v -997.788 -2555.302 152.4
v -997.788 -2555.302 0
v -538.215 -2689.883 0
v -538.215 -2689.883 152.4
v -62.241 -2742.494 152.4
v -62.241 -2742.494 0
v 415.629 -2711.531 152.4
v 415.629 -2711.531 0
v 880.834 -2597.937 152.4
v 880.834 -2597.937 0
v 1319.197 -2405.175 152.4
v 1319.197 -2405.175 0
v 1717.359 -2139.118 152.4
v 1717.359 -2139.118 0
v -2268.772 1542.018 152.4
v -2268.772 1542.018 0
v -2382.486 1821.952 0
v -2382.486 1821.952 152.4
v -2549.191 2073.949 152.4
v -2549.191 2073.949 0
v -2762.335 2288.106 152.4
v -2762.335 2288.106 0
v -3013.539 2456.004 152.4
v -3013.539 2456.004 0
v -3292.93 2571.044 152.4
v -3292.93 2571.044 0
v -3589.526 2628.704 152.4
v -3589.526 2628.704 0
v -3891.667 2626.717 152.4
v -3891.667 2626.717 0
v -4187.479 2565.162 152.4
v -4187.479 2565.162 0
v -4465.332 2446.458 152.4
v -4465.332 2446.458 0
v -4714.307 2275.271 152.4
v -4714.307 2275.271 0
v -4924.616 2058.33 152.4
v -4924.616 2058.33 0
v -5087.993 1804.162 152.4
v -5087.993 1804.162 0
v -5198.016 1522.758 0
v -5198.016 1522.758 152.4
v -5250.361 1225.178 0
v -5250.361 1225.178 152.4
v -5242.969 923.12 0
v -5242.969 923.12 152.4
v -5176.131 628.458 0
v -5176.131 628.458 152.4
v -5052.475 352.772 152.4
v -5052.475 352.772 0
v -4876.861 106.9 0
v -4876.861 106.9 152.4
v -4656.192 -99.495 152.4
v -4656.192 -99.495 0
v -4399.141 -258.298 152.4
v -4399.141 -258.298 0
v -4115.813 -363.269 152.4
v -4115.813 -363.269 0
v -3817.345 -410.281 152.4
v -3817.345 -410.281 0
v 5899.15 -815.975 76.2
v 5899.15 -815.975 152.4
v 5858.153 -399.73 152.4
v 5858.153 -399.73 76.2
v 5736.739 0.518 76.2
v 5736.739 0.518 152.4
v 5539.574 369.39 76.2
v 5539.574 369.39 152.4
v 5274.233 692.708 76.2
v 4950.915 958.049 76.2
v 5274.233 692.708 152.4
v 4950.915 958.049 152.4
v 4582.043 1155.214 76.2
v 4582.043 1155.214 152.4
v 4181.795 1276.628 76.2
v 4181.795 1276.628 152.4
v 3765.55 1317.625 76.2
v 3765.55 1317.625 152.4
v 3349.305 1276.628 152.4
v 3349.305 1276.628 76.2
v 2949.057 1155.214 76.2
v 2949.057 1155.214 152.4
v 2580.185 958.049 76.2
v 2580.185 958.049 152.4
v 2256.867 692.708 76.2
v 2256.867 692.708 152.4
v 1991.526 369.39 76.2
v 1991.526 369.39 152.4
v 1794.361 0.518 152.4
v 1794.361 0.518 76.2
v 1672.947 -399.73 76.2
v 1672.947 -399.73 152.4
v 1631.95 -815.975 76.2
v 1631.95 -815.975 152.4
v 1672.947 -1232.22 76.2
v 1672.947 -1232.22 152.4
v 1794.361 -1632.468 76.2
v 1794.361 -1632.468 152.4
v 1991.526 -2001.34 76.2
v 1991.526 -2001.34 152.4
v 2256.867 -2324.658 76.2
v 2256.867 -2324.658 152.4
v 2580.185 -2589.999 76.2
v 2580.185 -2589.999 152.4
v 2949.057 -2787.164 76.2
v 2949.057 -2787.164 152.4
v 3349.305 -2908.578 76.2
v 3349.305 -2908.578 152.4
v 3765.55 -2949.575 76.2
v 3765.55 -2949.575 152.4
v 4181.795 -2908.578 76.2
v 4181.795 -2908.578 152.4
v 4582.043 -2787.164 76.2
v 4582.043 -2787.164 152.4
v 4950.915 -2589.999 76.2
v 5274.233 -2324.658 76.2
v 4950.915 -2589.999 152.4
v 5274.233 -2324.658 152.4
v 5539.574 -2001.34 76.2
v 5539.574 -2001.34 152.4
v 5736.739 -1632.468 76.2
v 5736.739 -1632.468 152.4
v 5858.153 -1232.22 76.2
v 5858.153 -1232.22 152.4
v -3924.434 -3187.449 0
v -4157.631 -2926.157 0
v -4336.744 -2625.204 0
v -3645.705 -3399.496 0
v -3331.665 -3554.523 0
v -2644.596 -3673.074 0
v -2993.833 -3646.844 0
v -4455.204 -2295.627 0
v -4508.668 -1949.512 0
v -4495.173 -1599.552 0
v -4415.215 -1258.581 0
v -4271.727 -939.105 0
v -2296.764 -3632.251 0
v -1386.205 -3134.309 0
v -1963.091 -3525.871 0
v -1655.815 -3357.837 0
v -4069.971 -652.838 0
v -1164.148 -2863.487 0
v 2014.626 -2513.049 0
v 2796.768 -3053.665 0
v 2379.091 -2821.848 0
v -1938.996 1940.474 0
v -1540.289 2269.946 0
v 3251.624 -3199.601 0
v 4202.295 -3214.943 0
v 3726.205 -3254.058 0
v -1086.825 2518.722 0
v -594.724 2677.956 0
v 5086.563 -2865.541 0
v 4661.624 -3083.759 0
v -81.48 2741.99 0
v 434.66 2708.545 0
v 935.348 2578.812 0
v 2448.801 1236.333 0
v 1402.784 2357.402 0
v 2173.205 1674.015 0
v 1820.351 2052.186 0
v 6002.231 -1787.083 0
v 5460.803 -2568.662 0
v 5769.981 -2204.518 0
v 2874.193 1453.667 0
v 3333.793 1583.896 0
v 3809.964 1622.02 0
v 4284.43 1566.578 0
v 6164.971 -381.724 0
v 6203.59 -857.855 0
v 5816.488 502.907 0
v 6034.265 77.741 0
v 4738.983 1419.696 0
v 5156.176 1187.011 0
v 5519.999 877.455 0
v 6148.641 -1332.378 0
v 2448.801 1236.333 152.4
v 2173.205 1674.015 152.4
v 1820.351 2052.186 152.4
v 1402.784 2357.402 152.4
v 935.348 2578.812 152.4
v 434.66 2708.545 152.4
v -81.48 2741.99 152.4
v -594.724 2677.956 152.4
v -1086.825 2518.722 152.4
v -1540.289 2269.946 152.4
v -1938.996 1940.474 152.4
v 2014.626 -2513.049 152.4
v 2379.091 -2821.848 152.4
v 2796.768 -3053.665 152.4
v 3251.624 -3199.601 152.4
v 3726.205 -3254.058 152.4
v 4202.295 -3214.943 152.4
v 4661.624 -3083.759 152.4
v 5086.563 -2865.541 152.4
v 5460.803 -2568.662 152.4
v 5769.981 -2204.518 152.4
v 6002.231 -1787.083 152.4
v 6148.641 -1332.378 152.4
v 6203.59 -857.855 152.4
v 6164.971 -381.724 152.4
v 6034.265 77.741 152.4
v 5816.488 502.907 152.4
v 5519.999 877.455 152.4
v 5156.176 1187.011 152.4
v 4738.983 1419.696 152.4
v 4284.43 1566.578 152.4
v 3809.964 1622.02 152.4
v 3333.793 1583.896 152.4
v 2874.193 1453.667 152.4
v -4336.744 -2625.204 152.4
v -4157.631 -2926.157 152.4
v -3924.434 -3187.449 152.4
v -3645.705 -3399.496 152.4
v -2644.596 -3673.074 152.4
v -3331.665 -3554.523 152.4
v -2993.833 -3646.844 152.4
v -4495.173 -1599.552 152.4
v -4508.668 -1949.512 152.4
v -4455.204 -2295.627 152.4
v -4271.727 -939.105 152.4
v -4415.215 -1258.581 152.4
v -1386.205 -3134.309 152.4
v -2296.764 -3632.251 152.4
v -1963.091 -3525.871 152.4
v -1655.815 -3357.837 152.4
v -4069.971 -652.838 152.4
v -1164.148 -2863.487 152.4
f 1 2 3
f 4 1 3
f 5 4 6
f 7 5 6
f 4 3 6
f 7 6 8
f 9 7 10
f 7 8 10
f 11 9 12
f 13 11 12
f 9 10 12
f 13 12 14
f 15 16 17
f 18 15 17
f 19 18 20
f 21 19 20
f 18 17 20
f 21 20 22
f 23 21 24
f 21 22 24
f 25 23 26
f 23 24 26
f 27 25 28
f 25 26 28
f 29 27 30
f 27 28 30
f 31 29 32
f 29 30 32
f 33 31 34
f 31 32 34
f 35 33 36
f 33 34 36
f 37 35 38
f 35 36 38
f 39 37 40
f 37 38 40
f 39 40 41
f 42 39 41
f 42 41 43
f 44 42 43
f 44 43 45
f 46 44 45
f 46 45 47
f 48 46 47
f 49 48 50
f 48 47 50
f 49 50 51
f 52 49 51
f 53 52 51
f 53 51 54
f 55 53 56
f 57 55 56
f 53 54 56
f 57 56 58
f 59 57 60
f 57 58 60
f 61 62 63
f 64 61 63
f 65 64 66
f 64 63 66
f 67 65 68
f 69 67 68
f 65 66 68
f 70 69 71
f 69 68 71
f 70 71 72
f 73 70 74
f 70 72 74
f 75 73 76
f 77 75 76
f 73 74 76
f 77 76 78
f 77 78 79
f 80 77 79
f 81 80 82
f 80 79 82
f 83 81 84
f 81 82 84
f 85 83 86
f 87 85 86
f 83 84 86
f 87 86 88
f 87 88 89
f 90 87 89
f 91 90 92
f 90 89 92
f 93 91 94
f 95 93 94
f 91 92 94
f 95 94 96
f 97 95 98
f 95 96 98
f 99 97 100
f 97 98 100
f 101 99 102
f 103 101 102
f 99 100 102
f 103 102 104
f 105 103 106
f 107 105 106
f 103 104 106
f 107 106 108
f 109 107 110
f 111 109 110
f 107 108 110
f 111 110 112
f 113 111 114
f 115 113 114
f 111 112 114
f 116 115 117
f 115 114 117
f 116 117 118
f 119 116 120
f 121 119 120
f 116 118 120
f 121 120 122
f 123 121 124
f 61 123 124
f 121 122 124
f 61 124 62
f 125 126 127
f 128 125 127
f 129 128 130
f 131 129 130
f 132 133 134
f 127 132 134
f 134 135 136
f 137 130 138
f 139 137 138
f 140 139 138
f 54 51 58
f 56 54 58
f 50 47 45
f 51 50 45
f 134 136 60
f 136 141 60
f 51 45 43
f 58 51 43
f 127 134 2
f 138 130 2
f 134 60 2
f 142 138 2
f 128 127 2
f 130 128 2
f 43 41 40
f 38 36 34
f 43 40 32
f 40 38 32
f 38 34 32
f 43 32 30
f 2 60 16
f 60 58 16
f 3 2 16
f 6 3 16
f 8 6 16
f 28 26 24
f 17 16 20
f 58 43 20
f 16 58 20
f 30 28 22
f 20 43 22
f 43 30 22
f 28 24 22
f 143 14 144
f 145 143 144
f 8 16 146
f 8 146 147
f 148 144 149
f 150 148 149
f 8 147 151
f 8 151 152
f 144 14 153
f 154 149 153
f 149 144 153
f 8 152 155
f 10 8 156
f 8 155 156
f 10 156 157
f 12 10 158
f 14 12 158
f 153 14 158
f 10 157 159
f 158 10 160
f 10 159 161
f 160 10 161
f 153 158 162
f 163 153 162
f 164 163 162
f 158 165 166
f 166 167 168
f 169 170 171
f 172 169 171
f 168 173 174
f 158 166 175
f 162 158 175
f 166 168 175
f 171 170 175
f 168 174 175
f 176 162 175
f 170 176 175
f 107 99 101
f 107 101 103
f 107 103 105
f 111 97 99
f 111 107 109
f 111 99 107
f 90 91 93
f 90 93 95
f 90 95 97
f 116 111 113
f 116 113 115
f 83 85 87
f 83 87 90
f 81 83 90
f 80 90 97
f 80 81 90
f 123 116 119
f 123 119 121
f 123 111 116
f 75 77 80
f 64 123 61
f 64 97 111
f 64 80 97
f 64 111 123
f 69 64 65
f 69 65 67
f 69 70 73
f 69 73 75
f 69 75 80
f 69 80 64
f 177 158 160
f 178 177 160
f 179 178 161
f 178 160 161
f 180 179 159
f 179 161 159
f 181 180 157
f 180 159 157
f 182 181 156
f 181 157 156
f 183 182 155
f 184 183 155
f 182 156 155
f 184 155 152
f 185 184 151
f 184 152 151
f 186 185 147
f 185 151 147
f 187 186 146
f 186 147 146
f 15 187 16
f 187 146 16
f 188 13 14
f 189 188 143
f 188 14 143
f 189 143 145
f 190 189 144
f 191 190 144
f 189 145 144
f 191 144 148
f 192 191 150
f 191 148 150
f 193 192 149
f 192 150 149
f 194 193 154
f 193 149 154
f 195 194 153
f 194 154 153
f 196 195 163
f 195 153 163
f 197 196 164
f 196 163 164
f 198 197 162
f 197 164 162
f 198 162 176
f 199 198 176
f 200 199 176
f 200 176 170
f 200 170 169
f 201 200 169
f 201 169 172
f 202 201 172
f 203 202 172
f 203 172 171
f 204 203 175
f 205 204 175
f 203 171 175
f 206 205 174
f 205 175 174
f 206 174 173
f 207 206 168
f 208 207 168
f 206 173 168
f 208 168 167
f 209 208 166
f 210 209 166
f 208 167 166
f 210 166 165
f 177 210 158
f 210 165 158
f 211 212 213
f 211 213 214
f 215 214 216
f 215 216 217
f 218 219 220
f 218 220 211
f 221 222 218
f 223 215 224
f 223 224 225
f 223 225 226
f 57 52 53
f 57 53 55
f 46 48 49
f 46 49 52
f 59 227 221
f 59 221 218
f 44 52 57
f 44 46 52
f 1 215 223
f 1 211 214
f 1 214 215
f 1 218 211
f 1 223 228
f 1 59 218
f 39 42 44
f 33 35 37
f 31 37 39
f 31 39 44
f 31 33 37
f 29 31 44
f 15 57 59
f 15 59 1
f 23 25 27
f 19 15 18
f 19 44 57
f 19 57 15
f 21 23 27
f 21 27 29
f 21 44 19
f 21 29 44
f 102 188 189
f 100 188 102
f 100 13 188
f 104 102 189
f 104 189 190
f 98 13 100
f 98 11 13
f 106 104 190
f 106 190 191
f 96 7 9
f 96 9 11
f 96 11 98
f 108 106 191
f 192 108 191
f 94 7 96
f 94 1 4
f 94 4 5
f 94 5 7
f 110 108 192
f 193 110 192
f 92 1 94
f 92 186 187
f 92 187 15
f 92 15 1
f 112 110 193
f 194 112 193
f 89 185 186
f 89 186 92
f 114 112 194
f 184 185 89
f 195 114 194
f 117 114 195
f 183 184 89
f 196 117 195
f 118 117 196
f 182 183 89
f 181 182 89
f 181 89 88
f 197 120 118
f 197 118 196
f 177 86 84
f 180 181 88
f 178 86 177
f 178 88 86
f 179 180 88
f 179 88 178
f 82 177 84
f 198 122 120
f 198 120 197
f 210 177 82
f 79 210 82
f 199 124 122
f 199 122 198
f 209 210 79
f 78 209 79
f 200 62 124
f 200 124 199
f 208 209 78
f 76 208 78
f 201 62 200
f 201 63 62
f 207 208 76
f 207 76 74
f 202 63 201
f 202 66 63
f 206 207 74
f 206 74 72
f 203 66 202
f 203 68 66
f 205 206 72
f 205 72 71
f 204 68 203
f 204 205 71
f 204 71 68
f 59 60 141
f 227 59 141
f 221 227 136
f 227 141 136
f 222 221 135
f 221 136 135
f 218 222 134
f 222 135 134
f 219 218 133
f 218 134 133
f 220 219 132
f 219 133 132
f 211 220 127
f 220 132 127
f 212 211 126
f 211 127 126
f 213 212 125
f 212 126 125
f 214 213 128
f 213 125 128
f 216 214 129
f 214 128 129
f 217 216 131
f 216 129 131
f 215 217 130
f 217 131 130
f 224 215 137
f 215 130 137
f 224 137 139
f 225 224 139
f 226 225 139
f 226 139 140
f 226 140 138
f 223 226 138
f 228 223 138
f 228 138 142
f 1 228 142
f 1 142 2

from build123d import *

# Parameters (mm, degrees)
PAD_DEPTH    = 152.4
SKETCH001_R  = 2133.6
POCKET_DEPTH = 76.2


with BuildPart() as part:
    # Sketch → Pad (new body)
    with BuildSketch(Plane.XY):
        with BuildLine():
            ThreePointArc((-2268.771847, 1542.018335), (-4924.616457, 2058.329933), (-3817.345092, -410.280685))
            ThreePointArc((-3817.345092, -410.280685), (-3790.157019, -3300.159789), (-997.78766, -2555.301553))
            ThreePointArc((-997.78766, -2555.301553), (415.629454, -2711.530637), (1717.358723, -2139.117869))
            ThreePointArc((1717.358723, -2139.117869), (6148.640883, -1332.378336), (2448.801234, 1236.332786))
            ThreePointArc((2448.801234, 1236.332786), (177.379703, 2737.459165), (-2268.771847, 1542.018335))
        make_face()
    extrude(amount=PAD_DEPTH)

    # Sketch001 (on Face7 of Pad) → Pocket (cut)
    with BuildSketch(Plane.XY.offset(152.4)):
        with Locations((3765.55, -815.975)):
            Circle(SKETCH001_R)
    extrude(amount=-POCKET_DEPTH, mode=Mode.SUBTRACT)


solid = part.part
